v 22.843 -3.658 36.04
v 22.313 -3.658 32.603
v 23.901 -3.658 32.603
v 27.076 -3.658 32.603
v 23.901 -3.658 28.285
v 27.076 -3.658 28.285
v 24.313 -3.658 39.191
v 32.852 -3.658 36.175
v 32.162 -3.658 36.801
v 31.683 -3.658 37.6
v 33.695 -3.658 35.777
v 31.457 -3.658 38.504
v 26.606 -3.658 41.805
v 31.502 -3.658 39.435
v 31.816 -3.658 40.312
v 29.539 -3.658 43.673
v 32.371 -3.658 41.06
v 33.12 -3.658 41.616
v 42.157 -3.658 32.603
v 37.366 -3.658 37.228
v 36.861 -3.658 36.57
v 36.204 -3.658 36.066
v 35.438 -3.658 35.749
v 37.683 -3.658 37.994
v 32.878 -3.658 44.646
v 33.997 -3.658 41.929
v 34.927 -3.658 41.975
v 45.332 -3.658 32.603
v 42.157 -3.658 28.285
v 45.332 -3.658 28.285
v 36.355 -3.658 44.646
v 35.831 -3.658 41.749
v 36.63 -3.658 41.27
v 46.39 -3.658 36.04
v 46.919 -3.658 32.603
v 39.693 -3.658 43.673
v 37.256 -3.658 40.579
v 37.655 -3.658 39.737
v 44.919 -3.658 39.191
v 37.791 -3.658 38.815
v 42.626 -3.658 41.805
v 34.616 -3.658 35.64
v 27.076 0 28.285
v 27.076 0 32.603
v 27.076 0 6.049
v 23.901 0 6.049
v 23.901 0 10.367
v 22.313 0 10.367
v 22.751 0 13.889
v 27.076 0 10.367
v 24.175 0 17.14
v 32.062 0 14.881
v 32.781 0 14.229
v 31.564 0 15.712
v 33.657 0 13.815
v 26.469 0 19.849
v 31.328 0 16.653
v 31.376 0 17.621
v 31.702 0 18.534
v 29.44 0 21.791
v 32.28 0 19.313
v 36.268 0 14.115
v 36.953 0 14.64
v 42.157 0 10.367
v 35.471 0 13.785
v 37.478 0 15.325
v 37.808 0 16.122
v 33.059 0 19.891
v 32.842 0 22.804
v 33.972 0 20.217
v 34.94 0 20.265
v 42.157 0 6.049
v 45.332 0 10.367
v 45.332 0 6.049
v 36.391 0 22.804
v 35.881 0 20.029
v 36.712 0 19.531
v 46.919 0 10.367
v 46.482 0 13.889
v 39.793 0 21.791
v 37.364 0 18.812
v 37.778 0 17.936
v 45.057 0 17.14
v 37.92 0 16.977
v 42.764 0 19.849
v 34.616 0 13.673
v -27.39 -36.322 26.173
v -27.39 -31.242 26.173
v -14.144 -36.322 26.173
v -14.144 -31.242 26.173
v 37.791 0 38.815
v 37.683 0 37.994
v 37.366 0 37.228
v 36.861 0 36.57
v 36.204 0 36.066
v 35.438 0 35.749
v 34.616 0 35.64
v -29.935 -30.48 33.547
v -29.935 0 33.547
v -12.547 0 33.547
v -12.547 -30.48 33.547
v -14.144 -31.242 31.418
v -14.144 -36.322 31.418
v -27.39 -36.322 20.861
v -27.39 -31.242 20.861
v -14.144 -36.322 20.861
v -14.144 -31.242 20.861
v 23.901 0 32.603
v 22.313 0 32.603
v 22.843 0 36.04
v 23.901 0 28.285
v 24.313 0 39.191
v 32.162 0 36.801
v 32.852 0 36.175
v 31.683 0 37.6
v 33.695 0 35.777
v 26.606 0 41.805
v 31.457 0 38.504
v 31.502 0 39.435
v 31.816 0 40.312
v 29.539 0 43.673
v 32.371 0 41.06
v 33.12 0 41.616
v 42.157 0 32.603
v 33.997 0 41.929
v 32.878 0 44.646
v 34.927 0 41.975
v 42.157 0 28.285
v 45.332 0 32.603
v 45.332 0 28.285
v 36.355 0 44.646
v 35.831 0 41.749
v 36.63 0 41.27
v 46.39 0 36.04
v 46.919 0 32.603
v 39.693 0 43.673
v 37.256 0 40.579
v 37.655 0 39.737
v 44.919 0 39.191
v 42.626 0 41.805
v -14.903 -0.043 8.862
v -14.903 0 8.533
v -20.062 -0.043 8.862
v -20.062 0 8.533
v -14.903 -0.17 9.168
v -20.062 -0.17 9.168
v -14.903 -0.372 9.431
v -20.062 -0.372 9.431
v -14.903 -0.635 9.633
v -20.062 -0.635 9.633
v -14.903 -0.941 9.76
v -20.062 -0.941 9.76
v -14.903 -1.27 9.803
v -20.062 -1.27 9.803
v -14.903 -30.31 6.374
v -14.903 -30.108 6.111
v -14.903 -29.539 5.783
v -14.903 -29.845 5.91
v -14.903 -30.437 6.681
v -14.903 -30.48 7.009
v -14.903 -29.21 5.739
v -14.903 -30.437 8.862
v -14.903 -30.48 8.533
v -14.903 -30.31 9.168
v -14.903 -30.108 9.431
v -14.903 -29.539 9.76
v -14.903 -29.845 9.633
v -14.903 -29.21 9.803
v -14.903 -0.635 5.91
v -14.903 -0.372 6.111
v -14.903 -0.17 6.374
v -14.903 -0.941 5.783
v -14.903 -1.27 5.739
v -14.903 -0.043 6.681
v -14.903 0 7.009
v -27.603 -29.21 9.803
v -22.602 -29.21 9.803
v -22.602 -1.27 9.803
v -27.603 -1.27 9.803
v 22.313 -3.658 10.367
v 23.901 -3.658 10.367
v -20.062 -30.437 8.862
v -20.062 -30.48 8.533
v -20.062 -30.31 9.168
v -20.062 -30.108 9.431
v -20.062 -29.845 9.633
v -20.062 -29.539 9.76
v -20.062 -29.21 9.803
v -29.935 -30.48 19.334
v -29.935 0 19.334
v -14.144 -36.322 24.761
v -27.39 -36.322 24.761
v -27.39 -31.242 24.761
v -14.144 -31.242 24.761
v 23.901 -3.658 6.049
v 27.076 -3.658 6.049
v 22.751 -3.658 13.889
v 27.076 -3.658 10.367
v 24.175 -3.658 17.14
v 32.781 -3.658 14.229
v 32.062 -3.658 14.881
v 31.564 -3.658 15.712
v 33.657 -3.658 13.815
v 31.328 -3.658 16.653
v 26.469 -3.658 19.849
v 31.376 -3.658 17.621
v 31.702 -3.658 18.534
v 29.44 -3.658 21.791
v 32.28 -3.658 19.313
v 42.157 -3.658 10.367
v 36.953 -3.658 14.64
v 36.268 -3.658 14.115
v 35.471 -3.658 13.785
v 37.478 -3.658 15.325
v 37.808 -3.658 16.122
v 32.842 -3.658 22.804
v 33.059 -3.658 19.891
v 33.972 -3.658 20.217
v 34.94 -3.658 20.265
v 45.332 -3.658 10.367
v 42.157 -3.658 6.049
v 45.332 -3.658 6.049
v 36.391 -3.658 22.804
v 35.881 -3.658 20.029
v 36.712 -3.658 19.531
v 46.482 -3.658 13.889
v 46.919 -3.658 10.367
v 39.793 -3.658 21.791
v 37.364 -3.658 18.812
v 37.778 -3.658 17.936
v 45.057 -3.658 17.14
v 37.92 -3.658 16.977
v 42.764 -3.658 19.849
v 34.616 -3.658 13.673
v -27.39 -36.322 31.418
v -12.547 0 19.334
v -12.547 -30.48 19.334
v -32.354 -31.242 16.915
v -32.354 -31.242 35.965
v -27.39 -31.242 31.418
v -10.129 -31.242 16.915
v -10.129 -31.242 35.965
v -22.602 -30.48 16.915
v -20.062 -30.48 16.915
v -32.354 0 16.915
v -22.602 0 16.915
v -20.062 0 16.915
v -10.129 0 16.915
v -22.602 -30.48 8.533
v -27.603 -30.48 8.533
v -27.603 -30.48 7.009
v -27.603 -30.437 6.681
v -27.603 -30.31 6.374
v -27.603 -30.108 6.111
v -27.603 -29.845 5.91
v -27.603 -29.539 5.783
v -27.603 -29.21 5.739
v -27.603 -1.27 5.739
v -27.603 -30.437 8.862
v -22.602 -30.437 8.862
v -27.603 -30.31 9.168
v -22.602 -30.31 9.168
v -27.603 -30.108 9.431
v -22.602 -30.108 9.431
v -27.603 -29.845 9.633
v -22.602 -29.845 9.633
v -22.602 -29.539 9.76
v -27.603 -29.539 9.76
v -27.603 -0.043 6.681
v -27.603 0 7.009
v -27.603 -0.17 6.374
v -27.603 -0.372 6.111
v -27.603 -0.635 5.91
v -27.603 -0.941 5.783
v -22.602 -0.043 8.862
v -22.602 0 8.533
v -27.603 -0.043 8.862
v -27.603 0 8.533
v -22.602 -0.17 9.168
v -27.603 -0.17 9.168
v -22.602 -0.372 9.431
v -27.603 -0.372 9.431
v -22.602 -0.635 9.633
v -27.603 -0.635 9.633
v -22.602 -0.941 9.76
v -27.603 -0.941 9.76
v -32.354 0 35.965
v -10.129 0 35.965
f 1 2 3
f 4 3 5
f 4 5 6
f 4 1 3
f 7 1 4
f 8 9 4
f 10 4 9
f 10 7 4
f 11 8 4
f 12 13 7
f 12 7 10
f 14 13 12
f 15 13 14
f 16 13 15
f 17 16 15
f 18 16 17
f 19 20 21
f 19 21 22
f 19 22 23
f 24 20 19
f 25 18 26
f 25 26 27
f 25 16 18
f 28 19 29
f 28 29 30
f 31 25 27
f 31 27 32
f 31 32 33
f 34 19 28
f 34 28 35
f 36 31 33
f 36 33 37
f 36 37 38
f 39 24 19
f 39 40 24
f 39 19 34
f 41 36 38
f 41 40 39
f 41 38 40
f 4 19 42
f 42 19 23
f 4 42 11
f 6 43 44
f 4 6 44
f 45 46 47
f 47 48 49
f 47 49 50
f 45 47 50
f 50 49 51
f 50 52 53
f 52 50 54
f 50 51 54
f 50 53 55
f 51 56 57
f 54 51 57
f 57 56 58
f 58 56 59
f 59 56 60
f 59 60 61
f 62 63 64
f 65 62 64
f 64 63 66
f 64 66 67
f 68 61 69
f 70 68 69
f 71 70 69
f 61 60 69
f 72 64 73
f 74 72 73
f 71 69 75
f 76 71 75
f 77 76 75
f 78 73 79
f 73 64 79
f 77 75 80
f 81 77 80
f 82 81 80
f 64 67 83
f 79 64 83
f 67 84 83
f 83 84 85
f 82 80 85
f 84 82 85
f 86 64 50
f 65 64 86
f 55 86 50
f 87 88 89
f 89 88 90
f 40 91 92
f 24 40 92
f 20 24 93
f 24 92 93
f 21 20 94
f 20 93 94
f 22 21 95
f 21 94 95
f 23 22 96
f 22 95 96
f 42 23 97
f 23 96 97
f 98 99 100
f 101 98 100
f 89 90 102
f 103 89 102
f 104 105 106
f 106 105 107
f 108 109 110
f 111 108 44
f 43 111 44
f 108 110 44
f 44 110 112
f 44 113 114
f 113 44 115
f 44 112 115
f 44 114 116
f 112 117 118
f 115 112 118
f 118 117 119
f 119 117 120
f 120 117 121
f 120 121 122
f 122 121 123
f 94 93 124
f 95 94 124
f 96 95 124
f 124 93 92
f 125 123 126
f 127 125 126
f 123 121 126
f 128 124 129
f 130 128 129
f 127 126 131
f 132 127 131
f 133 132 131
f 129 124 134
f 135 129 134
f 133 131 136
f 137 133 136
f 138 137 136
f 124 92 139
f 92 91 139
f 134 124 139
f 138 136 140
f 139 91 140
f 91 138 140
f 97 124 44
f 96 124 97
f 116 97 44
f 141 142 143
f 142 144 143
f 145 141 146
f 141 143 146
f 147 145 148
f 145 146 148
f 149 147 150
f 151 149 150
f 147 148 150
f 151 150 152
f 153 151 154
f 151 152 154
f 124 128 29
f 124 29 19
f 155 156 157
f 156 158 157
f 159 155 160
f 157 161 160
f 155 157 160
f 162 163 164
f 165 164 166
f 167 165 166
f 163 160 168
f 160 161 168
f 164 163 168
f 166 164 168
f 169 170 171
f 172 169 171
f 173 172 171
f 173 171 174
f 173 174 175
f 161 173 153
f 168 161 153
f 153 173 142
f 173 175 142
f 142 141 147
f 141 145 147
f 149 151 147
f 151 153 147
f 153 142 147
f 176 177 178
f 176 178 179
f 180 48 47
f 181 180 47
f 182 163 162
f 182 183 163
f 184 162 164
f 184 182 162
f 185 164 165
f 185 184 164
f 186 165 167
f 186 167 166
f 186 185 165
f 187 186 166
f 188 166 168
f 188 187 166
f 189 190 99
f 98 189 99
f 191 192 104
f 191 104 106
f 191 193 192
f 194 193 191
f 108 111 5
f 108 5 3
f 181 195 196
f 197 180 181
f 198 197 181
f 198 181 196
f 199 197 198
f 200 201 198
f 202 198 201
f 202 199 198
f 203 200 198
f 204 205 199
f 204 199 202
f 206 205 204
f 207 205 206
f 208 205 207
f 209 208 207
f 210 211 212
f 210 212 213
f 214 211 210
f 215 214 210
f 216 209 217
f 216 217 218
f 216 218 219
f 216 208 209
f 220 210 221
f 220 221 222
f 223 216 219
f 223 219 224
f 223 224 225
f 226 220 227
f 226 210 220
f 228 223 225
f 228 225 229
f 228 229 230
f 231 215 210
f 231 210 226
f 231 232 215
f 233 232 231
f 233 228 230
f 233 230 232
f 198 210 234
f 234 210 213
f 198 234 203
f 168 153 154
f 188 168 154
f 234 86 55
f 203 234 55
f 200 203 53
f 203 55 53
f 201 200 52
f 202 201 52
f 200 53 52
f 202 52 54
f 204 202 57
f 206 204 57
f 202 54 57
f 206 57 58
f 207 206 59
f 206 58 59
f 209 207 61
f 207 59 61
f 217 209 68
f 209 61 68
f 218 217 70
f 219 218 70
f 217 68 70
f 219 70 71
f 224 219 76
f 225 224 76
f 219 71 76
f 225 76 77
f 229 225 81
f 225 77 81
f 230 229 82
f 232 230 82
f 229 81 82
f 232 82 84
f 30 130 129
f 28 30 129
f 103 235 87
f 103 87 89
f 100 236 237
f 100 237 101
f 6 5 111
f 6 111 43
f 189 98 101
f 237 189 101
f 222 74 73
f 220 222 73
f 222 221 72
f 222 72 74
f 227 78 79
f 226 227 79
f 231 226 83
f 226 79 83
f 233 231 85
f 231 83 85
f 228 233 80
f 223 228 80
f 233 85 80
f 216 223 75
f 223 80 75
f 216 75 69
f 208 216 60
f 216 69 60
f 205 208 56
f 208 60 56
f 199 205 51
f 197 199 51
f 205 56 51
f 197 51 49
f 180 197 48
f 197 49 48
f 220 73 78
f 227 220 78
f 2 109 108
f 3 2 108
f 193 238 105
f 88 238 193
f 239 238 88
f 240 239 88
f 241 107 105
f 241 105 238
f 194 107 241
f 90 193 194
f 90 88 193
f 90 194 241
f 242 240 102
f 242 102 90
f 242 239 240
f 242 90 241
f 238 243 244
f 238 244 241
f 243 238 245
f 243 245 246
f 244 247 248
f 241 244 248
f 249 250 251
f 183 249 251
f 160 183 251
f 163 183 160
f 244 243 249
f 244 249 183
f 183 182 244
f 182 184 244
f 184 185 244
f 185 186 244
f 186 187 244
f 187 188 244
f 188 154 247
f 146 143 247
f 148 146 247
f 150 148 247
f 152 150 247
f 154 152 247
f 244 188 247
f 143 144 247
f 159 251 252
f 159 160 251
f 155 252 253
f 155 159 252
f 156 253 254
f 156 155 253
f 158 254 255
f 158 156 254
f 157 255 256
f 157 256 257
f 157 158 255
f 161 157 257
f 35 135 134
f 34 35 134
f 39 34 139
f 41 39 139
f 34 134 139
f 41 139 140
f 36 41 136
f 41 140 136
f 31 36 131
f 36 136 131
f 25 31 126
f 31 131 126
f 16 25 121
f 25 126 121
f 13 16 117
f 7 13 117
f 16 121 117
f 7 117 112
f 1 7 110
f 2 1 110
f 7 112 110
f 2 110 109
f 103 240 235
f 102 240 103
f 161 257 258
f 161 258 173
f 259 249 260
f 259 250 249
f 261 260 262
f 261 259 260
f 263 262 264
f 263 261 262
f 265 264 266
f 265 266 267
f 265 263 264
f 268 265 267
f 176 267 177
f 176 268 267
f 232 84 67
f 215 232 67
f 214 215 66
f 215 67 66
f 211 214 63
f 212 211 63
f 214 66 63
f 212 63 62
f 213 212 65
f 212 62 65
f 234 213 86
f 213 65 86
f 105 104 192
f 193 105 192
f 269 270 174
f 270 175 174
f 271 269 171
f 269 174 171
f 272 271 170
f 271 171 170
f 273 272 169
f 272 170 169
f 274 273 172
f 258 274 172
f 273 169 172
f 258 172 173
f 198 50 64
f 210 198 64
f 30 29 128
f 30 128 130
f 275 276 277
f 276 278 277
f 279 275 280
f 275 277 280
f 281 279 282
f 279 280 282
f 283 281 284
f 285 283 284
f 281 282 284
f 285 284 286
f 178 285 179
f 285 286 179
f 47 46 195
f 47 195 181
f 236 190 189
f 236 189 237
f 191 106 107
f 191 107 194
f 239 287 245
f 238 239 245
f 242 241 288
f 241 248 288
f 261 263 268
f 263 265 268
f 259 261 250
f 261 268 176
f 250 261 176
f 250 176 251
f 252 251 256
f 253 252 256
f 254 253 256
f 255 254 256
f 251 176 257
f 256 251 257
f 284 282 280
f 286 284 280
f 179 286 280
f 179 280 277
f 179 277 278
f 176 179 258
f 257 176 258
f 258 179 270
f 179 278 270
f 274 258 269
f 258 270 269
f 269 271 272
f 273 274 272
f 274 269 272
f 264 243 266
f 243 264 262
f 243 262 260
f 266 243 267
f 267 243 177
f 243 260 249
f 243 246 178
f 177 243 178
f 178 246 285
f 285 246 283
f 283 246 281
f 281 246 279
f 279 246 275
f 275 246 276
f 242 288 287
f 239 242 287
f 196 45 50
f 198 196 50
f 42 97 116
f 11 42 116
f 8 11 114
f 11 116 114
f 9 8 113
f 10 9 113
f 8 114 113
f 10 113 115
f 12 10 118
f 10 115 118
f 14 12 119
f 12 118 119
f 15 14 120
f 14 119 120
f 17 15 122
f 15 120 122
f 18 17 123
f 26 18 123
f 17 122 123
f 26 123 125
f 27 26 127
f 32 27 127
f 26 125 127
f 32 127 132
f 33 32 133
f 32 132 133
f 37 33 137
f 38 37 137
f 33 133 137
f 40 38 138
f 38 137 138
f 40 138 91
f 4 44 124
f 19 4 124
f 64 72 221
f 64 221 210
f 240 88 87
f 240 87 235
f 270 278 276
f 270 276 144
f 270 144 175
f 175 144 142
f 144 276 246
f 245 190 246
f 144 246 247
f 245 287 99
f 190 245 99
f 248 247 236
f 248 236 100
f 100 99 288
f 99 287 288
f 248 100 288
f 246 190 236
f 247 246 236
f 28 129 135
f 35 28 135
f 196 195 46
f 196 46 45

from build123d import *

# Parameters (mm, degrees)
F0_W     = 17.3881341827
F0_H     = 14.2131341827
F1_DEPTH = 30.48
F2_W     = 17.3881341827
F2_H     = 14.2131341827
F3_DEPTH = 0.762
F4_W     = 3.175
F4_H     = 4.318
F5_DEPTH = 3.6576
F6_R     = 1.27
F7_W     = 13.2463751361
F7_H     = 5.2447561175
F7_H_2   = 3.8999486715
F8_DEPTH = 5.08


with BuildPart() as f1:
    # F0 (on Front) → F1 (new body)
    with BuildSketch(Plane.XZ):
        Polygon((-10.1287699878, 35.9654333509), (-32.3537699878, 35.9654333509), (-32.3537699878, 16.9154333509), (-22.6019585633, 16.9154333509), (-21.3319585633, 16.9154333509), (-20.0619585633, 16.9154333509), (-10.1287699878, 16.9154333509), align=None)
        with Locations((-21.2412699878, 26.4404333509)):
            Rectangle(F0_W, F0_H, mode=Mode.SUBTRACT)
        Polygon((-21.3319585633, 16.9154333509), (-22.6019585633, 16.9154333509), (-22.6019585633, 9.8034333509), (-27.6028375745, 9.8034333509), (-27.6028375745, 5.7394333509), (-21.2528375745, 5.7394333509), align=None)
        Polygon((-20.0619585633, 9.8034333509), (-20.0619585633, 16.9154333509), (-21.3319585633, 16.9154333509), (-21.2528375745, 5.7394333509), (-14.9028375745, 5.7394333509), (-14.9028375745, 9.8034333509), align=None)
    extrude(amount=F1_DEPTH)

    # F2 (on face) → F3 (join)
    with BuildSketch(Plane.XZ.offset(30.48)):
        Polygon((-32.3537699878, 35.9654333509), (-32.3537699878, 16.9154333509), (-22.6019585633, 16.9154333509), (-20.0619585633, 16.9154333509), (-10.1287699878, 16.9154333509), (-10.1287699878, 35.9654333509), align=None)
        with Locations((-21.2412699878, 26.4404333509)):
            Rectangle(F2_W, F2_H, mode=Mode.SUBTRACT)
        with Locations((-21.2412699878, 26.4404333509)):
            Rectangle(F2_W, F2_H)
    extrude(amount=F3_DEPTH)

    # F6
    f6_edges = [f1.edges().sort_by_distance(p)[0] for p in [
        (-17.482398, 0, 9.803433),
        (-25.102398, -30.48, 9.803433),
        (-21.252838, -30.48, 5.739433),
        (-21.252838, 0, 5.739433),
        (-17.482398, -30.48, 9.803433),
        (-25.102398, 0, 9.803433),
    ]]
    fillet(f6_edges, radius=F6_R)

    # F7 (on face) → F8 (join)
    with BuildSketch(Plane.XZ.offset(31.242)):
        with Locations((-20.7667914219, 28.7951519713)):
            Rectangle(F7_W, F7_H)
        with Locations((-20.7667914219, 22.8107506409)):
            Rectangle(F7_W, F7_H_2)
    extrude(amount=F8_DEPTH)


with BuildPart() as f5:
    # F4 (on Front) → F5 (new body)
    with BuildSketch(Plane.XZ):
        with BuildLine():
            Line((45.3319033712, 10.3666791692), (46.9194033712, 10.3666791692))
            ThreePointArc((46.9194033712, 10.3666791692), (34.6162783712, 22.9325723409), (22.3131533712, 10.3666791692))
            Line((22.3131533712, 10.3666791692), (23.9006533712, 10.3666791692))
            Line((23.9006533712, 10.3666791692), (27.0756533712, 10.3666791692))
            Line((27.0756533712, 10.3666791692), (42.1569033712, 10.3666791692))
            Line((42.1569033712, 10.3666791692), (45.3319033712, 10.3666791692))
        make_face()
        with BuildLine():
            ThreePointArc((34.6162783712, 13.6726312353), (32.2799489852, 19.3130293252), (37.9203470751, 16.9766999392))
            ThreePointArc((37.9203470751, 16.9766999392), (36.9526077572, 14.6403705532), (34.6162783712, 13.6726312353))
        make_face(mode=Mode.SUBTRACT)
        with Locations((43.7444033712, 8.2076791692)):
            Rectangle(F4_W, F4_H)
        with Locations((25.4881533712, 8.2076791692)):
            Rectangle(F4_W, F4_H)
    extrude(amount=F5_DEPTH)


with BuildPart() as f5b:
    # F4 (on Front) → F5, piece 2 (new body)
    with BuildSketch(Plane.XZ):
        with BuildLine():
            Line((45.3319033712, 32.6032228768), (46.9194033712, 32.6032228768))
            ThreePointArc((46.9194033712, 32.6032228768), (34.6162783712, 44.7693123418), (22.3131533712, 32.6032228768))
            Line((22.3131533712, 32.6032228768), (23.9006533712, 32.6032228768))
            Line((23.9006533712, 32.6032228768), (27.0756533712, 32.6032228768))
            Line((27.0756533712, 32.6032228768), (34.6162783712, 32.6032228768))
            Line((34.6162783712, 32.6032228768), (42.1569033712, 32.6032228768))
            Line((42.1569033712, 32.6032228768), (45.3319033712, 32.6032228768))
        make_face()
        with BuildLine():
            ThreePointArc((37.7912783712, 38.8154155762), (36.8613424015, 36.5703515459), (34.6162783712, 35.6404155762))
            ThreePointArc((34.6162783712, 35.6404155762), (32.3712143409, 41.0604796065), (37.7912783712, 38.8154155762))
        make_face(mode=Mode.SUBTRACT)
        with Locations((43.7444033712, 30.4442228768)):
            Rectangle(F4_W, F4_H)
        with Locations((25.4881533712, 30.4442228768)):
            Rectangle(F4_W, F4_H)
    extrude(amount=F5_DEPTH)


solid = Compound([f1.part, f5.part, f5b.part])
